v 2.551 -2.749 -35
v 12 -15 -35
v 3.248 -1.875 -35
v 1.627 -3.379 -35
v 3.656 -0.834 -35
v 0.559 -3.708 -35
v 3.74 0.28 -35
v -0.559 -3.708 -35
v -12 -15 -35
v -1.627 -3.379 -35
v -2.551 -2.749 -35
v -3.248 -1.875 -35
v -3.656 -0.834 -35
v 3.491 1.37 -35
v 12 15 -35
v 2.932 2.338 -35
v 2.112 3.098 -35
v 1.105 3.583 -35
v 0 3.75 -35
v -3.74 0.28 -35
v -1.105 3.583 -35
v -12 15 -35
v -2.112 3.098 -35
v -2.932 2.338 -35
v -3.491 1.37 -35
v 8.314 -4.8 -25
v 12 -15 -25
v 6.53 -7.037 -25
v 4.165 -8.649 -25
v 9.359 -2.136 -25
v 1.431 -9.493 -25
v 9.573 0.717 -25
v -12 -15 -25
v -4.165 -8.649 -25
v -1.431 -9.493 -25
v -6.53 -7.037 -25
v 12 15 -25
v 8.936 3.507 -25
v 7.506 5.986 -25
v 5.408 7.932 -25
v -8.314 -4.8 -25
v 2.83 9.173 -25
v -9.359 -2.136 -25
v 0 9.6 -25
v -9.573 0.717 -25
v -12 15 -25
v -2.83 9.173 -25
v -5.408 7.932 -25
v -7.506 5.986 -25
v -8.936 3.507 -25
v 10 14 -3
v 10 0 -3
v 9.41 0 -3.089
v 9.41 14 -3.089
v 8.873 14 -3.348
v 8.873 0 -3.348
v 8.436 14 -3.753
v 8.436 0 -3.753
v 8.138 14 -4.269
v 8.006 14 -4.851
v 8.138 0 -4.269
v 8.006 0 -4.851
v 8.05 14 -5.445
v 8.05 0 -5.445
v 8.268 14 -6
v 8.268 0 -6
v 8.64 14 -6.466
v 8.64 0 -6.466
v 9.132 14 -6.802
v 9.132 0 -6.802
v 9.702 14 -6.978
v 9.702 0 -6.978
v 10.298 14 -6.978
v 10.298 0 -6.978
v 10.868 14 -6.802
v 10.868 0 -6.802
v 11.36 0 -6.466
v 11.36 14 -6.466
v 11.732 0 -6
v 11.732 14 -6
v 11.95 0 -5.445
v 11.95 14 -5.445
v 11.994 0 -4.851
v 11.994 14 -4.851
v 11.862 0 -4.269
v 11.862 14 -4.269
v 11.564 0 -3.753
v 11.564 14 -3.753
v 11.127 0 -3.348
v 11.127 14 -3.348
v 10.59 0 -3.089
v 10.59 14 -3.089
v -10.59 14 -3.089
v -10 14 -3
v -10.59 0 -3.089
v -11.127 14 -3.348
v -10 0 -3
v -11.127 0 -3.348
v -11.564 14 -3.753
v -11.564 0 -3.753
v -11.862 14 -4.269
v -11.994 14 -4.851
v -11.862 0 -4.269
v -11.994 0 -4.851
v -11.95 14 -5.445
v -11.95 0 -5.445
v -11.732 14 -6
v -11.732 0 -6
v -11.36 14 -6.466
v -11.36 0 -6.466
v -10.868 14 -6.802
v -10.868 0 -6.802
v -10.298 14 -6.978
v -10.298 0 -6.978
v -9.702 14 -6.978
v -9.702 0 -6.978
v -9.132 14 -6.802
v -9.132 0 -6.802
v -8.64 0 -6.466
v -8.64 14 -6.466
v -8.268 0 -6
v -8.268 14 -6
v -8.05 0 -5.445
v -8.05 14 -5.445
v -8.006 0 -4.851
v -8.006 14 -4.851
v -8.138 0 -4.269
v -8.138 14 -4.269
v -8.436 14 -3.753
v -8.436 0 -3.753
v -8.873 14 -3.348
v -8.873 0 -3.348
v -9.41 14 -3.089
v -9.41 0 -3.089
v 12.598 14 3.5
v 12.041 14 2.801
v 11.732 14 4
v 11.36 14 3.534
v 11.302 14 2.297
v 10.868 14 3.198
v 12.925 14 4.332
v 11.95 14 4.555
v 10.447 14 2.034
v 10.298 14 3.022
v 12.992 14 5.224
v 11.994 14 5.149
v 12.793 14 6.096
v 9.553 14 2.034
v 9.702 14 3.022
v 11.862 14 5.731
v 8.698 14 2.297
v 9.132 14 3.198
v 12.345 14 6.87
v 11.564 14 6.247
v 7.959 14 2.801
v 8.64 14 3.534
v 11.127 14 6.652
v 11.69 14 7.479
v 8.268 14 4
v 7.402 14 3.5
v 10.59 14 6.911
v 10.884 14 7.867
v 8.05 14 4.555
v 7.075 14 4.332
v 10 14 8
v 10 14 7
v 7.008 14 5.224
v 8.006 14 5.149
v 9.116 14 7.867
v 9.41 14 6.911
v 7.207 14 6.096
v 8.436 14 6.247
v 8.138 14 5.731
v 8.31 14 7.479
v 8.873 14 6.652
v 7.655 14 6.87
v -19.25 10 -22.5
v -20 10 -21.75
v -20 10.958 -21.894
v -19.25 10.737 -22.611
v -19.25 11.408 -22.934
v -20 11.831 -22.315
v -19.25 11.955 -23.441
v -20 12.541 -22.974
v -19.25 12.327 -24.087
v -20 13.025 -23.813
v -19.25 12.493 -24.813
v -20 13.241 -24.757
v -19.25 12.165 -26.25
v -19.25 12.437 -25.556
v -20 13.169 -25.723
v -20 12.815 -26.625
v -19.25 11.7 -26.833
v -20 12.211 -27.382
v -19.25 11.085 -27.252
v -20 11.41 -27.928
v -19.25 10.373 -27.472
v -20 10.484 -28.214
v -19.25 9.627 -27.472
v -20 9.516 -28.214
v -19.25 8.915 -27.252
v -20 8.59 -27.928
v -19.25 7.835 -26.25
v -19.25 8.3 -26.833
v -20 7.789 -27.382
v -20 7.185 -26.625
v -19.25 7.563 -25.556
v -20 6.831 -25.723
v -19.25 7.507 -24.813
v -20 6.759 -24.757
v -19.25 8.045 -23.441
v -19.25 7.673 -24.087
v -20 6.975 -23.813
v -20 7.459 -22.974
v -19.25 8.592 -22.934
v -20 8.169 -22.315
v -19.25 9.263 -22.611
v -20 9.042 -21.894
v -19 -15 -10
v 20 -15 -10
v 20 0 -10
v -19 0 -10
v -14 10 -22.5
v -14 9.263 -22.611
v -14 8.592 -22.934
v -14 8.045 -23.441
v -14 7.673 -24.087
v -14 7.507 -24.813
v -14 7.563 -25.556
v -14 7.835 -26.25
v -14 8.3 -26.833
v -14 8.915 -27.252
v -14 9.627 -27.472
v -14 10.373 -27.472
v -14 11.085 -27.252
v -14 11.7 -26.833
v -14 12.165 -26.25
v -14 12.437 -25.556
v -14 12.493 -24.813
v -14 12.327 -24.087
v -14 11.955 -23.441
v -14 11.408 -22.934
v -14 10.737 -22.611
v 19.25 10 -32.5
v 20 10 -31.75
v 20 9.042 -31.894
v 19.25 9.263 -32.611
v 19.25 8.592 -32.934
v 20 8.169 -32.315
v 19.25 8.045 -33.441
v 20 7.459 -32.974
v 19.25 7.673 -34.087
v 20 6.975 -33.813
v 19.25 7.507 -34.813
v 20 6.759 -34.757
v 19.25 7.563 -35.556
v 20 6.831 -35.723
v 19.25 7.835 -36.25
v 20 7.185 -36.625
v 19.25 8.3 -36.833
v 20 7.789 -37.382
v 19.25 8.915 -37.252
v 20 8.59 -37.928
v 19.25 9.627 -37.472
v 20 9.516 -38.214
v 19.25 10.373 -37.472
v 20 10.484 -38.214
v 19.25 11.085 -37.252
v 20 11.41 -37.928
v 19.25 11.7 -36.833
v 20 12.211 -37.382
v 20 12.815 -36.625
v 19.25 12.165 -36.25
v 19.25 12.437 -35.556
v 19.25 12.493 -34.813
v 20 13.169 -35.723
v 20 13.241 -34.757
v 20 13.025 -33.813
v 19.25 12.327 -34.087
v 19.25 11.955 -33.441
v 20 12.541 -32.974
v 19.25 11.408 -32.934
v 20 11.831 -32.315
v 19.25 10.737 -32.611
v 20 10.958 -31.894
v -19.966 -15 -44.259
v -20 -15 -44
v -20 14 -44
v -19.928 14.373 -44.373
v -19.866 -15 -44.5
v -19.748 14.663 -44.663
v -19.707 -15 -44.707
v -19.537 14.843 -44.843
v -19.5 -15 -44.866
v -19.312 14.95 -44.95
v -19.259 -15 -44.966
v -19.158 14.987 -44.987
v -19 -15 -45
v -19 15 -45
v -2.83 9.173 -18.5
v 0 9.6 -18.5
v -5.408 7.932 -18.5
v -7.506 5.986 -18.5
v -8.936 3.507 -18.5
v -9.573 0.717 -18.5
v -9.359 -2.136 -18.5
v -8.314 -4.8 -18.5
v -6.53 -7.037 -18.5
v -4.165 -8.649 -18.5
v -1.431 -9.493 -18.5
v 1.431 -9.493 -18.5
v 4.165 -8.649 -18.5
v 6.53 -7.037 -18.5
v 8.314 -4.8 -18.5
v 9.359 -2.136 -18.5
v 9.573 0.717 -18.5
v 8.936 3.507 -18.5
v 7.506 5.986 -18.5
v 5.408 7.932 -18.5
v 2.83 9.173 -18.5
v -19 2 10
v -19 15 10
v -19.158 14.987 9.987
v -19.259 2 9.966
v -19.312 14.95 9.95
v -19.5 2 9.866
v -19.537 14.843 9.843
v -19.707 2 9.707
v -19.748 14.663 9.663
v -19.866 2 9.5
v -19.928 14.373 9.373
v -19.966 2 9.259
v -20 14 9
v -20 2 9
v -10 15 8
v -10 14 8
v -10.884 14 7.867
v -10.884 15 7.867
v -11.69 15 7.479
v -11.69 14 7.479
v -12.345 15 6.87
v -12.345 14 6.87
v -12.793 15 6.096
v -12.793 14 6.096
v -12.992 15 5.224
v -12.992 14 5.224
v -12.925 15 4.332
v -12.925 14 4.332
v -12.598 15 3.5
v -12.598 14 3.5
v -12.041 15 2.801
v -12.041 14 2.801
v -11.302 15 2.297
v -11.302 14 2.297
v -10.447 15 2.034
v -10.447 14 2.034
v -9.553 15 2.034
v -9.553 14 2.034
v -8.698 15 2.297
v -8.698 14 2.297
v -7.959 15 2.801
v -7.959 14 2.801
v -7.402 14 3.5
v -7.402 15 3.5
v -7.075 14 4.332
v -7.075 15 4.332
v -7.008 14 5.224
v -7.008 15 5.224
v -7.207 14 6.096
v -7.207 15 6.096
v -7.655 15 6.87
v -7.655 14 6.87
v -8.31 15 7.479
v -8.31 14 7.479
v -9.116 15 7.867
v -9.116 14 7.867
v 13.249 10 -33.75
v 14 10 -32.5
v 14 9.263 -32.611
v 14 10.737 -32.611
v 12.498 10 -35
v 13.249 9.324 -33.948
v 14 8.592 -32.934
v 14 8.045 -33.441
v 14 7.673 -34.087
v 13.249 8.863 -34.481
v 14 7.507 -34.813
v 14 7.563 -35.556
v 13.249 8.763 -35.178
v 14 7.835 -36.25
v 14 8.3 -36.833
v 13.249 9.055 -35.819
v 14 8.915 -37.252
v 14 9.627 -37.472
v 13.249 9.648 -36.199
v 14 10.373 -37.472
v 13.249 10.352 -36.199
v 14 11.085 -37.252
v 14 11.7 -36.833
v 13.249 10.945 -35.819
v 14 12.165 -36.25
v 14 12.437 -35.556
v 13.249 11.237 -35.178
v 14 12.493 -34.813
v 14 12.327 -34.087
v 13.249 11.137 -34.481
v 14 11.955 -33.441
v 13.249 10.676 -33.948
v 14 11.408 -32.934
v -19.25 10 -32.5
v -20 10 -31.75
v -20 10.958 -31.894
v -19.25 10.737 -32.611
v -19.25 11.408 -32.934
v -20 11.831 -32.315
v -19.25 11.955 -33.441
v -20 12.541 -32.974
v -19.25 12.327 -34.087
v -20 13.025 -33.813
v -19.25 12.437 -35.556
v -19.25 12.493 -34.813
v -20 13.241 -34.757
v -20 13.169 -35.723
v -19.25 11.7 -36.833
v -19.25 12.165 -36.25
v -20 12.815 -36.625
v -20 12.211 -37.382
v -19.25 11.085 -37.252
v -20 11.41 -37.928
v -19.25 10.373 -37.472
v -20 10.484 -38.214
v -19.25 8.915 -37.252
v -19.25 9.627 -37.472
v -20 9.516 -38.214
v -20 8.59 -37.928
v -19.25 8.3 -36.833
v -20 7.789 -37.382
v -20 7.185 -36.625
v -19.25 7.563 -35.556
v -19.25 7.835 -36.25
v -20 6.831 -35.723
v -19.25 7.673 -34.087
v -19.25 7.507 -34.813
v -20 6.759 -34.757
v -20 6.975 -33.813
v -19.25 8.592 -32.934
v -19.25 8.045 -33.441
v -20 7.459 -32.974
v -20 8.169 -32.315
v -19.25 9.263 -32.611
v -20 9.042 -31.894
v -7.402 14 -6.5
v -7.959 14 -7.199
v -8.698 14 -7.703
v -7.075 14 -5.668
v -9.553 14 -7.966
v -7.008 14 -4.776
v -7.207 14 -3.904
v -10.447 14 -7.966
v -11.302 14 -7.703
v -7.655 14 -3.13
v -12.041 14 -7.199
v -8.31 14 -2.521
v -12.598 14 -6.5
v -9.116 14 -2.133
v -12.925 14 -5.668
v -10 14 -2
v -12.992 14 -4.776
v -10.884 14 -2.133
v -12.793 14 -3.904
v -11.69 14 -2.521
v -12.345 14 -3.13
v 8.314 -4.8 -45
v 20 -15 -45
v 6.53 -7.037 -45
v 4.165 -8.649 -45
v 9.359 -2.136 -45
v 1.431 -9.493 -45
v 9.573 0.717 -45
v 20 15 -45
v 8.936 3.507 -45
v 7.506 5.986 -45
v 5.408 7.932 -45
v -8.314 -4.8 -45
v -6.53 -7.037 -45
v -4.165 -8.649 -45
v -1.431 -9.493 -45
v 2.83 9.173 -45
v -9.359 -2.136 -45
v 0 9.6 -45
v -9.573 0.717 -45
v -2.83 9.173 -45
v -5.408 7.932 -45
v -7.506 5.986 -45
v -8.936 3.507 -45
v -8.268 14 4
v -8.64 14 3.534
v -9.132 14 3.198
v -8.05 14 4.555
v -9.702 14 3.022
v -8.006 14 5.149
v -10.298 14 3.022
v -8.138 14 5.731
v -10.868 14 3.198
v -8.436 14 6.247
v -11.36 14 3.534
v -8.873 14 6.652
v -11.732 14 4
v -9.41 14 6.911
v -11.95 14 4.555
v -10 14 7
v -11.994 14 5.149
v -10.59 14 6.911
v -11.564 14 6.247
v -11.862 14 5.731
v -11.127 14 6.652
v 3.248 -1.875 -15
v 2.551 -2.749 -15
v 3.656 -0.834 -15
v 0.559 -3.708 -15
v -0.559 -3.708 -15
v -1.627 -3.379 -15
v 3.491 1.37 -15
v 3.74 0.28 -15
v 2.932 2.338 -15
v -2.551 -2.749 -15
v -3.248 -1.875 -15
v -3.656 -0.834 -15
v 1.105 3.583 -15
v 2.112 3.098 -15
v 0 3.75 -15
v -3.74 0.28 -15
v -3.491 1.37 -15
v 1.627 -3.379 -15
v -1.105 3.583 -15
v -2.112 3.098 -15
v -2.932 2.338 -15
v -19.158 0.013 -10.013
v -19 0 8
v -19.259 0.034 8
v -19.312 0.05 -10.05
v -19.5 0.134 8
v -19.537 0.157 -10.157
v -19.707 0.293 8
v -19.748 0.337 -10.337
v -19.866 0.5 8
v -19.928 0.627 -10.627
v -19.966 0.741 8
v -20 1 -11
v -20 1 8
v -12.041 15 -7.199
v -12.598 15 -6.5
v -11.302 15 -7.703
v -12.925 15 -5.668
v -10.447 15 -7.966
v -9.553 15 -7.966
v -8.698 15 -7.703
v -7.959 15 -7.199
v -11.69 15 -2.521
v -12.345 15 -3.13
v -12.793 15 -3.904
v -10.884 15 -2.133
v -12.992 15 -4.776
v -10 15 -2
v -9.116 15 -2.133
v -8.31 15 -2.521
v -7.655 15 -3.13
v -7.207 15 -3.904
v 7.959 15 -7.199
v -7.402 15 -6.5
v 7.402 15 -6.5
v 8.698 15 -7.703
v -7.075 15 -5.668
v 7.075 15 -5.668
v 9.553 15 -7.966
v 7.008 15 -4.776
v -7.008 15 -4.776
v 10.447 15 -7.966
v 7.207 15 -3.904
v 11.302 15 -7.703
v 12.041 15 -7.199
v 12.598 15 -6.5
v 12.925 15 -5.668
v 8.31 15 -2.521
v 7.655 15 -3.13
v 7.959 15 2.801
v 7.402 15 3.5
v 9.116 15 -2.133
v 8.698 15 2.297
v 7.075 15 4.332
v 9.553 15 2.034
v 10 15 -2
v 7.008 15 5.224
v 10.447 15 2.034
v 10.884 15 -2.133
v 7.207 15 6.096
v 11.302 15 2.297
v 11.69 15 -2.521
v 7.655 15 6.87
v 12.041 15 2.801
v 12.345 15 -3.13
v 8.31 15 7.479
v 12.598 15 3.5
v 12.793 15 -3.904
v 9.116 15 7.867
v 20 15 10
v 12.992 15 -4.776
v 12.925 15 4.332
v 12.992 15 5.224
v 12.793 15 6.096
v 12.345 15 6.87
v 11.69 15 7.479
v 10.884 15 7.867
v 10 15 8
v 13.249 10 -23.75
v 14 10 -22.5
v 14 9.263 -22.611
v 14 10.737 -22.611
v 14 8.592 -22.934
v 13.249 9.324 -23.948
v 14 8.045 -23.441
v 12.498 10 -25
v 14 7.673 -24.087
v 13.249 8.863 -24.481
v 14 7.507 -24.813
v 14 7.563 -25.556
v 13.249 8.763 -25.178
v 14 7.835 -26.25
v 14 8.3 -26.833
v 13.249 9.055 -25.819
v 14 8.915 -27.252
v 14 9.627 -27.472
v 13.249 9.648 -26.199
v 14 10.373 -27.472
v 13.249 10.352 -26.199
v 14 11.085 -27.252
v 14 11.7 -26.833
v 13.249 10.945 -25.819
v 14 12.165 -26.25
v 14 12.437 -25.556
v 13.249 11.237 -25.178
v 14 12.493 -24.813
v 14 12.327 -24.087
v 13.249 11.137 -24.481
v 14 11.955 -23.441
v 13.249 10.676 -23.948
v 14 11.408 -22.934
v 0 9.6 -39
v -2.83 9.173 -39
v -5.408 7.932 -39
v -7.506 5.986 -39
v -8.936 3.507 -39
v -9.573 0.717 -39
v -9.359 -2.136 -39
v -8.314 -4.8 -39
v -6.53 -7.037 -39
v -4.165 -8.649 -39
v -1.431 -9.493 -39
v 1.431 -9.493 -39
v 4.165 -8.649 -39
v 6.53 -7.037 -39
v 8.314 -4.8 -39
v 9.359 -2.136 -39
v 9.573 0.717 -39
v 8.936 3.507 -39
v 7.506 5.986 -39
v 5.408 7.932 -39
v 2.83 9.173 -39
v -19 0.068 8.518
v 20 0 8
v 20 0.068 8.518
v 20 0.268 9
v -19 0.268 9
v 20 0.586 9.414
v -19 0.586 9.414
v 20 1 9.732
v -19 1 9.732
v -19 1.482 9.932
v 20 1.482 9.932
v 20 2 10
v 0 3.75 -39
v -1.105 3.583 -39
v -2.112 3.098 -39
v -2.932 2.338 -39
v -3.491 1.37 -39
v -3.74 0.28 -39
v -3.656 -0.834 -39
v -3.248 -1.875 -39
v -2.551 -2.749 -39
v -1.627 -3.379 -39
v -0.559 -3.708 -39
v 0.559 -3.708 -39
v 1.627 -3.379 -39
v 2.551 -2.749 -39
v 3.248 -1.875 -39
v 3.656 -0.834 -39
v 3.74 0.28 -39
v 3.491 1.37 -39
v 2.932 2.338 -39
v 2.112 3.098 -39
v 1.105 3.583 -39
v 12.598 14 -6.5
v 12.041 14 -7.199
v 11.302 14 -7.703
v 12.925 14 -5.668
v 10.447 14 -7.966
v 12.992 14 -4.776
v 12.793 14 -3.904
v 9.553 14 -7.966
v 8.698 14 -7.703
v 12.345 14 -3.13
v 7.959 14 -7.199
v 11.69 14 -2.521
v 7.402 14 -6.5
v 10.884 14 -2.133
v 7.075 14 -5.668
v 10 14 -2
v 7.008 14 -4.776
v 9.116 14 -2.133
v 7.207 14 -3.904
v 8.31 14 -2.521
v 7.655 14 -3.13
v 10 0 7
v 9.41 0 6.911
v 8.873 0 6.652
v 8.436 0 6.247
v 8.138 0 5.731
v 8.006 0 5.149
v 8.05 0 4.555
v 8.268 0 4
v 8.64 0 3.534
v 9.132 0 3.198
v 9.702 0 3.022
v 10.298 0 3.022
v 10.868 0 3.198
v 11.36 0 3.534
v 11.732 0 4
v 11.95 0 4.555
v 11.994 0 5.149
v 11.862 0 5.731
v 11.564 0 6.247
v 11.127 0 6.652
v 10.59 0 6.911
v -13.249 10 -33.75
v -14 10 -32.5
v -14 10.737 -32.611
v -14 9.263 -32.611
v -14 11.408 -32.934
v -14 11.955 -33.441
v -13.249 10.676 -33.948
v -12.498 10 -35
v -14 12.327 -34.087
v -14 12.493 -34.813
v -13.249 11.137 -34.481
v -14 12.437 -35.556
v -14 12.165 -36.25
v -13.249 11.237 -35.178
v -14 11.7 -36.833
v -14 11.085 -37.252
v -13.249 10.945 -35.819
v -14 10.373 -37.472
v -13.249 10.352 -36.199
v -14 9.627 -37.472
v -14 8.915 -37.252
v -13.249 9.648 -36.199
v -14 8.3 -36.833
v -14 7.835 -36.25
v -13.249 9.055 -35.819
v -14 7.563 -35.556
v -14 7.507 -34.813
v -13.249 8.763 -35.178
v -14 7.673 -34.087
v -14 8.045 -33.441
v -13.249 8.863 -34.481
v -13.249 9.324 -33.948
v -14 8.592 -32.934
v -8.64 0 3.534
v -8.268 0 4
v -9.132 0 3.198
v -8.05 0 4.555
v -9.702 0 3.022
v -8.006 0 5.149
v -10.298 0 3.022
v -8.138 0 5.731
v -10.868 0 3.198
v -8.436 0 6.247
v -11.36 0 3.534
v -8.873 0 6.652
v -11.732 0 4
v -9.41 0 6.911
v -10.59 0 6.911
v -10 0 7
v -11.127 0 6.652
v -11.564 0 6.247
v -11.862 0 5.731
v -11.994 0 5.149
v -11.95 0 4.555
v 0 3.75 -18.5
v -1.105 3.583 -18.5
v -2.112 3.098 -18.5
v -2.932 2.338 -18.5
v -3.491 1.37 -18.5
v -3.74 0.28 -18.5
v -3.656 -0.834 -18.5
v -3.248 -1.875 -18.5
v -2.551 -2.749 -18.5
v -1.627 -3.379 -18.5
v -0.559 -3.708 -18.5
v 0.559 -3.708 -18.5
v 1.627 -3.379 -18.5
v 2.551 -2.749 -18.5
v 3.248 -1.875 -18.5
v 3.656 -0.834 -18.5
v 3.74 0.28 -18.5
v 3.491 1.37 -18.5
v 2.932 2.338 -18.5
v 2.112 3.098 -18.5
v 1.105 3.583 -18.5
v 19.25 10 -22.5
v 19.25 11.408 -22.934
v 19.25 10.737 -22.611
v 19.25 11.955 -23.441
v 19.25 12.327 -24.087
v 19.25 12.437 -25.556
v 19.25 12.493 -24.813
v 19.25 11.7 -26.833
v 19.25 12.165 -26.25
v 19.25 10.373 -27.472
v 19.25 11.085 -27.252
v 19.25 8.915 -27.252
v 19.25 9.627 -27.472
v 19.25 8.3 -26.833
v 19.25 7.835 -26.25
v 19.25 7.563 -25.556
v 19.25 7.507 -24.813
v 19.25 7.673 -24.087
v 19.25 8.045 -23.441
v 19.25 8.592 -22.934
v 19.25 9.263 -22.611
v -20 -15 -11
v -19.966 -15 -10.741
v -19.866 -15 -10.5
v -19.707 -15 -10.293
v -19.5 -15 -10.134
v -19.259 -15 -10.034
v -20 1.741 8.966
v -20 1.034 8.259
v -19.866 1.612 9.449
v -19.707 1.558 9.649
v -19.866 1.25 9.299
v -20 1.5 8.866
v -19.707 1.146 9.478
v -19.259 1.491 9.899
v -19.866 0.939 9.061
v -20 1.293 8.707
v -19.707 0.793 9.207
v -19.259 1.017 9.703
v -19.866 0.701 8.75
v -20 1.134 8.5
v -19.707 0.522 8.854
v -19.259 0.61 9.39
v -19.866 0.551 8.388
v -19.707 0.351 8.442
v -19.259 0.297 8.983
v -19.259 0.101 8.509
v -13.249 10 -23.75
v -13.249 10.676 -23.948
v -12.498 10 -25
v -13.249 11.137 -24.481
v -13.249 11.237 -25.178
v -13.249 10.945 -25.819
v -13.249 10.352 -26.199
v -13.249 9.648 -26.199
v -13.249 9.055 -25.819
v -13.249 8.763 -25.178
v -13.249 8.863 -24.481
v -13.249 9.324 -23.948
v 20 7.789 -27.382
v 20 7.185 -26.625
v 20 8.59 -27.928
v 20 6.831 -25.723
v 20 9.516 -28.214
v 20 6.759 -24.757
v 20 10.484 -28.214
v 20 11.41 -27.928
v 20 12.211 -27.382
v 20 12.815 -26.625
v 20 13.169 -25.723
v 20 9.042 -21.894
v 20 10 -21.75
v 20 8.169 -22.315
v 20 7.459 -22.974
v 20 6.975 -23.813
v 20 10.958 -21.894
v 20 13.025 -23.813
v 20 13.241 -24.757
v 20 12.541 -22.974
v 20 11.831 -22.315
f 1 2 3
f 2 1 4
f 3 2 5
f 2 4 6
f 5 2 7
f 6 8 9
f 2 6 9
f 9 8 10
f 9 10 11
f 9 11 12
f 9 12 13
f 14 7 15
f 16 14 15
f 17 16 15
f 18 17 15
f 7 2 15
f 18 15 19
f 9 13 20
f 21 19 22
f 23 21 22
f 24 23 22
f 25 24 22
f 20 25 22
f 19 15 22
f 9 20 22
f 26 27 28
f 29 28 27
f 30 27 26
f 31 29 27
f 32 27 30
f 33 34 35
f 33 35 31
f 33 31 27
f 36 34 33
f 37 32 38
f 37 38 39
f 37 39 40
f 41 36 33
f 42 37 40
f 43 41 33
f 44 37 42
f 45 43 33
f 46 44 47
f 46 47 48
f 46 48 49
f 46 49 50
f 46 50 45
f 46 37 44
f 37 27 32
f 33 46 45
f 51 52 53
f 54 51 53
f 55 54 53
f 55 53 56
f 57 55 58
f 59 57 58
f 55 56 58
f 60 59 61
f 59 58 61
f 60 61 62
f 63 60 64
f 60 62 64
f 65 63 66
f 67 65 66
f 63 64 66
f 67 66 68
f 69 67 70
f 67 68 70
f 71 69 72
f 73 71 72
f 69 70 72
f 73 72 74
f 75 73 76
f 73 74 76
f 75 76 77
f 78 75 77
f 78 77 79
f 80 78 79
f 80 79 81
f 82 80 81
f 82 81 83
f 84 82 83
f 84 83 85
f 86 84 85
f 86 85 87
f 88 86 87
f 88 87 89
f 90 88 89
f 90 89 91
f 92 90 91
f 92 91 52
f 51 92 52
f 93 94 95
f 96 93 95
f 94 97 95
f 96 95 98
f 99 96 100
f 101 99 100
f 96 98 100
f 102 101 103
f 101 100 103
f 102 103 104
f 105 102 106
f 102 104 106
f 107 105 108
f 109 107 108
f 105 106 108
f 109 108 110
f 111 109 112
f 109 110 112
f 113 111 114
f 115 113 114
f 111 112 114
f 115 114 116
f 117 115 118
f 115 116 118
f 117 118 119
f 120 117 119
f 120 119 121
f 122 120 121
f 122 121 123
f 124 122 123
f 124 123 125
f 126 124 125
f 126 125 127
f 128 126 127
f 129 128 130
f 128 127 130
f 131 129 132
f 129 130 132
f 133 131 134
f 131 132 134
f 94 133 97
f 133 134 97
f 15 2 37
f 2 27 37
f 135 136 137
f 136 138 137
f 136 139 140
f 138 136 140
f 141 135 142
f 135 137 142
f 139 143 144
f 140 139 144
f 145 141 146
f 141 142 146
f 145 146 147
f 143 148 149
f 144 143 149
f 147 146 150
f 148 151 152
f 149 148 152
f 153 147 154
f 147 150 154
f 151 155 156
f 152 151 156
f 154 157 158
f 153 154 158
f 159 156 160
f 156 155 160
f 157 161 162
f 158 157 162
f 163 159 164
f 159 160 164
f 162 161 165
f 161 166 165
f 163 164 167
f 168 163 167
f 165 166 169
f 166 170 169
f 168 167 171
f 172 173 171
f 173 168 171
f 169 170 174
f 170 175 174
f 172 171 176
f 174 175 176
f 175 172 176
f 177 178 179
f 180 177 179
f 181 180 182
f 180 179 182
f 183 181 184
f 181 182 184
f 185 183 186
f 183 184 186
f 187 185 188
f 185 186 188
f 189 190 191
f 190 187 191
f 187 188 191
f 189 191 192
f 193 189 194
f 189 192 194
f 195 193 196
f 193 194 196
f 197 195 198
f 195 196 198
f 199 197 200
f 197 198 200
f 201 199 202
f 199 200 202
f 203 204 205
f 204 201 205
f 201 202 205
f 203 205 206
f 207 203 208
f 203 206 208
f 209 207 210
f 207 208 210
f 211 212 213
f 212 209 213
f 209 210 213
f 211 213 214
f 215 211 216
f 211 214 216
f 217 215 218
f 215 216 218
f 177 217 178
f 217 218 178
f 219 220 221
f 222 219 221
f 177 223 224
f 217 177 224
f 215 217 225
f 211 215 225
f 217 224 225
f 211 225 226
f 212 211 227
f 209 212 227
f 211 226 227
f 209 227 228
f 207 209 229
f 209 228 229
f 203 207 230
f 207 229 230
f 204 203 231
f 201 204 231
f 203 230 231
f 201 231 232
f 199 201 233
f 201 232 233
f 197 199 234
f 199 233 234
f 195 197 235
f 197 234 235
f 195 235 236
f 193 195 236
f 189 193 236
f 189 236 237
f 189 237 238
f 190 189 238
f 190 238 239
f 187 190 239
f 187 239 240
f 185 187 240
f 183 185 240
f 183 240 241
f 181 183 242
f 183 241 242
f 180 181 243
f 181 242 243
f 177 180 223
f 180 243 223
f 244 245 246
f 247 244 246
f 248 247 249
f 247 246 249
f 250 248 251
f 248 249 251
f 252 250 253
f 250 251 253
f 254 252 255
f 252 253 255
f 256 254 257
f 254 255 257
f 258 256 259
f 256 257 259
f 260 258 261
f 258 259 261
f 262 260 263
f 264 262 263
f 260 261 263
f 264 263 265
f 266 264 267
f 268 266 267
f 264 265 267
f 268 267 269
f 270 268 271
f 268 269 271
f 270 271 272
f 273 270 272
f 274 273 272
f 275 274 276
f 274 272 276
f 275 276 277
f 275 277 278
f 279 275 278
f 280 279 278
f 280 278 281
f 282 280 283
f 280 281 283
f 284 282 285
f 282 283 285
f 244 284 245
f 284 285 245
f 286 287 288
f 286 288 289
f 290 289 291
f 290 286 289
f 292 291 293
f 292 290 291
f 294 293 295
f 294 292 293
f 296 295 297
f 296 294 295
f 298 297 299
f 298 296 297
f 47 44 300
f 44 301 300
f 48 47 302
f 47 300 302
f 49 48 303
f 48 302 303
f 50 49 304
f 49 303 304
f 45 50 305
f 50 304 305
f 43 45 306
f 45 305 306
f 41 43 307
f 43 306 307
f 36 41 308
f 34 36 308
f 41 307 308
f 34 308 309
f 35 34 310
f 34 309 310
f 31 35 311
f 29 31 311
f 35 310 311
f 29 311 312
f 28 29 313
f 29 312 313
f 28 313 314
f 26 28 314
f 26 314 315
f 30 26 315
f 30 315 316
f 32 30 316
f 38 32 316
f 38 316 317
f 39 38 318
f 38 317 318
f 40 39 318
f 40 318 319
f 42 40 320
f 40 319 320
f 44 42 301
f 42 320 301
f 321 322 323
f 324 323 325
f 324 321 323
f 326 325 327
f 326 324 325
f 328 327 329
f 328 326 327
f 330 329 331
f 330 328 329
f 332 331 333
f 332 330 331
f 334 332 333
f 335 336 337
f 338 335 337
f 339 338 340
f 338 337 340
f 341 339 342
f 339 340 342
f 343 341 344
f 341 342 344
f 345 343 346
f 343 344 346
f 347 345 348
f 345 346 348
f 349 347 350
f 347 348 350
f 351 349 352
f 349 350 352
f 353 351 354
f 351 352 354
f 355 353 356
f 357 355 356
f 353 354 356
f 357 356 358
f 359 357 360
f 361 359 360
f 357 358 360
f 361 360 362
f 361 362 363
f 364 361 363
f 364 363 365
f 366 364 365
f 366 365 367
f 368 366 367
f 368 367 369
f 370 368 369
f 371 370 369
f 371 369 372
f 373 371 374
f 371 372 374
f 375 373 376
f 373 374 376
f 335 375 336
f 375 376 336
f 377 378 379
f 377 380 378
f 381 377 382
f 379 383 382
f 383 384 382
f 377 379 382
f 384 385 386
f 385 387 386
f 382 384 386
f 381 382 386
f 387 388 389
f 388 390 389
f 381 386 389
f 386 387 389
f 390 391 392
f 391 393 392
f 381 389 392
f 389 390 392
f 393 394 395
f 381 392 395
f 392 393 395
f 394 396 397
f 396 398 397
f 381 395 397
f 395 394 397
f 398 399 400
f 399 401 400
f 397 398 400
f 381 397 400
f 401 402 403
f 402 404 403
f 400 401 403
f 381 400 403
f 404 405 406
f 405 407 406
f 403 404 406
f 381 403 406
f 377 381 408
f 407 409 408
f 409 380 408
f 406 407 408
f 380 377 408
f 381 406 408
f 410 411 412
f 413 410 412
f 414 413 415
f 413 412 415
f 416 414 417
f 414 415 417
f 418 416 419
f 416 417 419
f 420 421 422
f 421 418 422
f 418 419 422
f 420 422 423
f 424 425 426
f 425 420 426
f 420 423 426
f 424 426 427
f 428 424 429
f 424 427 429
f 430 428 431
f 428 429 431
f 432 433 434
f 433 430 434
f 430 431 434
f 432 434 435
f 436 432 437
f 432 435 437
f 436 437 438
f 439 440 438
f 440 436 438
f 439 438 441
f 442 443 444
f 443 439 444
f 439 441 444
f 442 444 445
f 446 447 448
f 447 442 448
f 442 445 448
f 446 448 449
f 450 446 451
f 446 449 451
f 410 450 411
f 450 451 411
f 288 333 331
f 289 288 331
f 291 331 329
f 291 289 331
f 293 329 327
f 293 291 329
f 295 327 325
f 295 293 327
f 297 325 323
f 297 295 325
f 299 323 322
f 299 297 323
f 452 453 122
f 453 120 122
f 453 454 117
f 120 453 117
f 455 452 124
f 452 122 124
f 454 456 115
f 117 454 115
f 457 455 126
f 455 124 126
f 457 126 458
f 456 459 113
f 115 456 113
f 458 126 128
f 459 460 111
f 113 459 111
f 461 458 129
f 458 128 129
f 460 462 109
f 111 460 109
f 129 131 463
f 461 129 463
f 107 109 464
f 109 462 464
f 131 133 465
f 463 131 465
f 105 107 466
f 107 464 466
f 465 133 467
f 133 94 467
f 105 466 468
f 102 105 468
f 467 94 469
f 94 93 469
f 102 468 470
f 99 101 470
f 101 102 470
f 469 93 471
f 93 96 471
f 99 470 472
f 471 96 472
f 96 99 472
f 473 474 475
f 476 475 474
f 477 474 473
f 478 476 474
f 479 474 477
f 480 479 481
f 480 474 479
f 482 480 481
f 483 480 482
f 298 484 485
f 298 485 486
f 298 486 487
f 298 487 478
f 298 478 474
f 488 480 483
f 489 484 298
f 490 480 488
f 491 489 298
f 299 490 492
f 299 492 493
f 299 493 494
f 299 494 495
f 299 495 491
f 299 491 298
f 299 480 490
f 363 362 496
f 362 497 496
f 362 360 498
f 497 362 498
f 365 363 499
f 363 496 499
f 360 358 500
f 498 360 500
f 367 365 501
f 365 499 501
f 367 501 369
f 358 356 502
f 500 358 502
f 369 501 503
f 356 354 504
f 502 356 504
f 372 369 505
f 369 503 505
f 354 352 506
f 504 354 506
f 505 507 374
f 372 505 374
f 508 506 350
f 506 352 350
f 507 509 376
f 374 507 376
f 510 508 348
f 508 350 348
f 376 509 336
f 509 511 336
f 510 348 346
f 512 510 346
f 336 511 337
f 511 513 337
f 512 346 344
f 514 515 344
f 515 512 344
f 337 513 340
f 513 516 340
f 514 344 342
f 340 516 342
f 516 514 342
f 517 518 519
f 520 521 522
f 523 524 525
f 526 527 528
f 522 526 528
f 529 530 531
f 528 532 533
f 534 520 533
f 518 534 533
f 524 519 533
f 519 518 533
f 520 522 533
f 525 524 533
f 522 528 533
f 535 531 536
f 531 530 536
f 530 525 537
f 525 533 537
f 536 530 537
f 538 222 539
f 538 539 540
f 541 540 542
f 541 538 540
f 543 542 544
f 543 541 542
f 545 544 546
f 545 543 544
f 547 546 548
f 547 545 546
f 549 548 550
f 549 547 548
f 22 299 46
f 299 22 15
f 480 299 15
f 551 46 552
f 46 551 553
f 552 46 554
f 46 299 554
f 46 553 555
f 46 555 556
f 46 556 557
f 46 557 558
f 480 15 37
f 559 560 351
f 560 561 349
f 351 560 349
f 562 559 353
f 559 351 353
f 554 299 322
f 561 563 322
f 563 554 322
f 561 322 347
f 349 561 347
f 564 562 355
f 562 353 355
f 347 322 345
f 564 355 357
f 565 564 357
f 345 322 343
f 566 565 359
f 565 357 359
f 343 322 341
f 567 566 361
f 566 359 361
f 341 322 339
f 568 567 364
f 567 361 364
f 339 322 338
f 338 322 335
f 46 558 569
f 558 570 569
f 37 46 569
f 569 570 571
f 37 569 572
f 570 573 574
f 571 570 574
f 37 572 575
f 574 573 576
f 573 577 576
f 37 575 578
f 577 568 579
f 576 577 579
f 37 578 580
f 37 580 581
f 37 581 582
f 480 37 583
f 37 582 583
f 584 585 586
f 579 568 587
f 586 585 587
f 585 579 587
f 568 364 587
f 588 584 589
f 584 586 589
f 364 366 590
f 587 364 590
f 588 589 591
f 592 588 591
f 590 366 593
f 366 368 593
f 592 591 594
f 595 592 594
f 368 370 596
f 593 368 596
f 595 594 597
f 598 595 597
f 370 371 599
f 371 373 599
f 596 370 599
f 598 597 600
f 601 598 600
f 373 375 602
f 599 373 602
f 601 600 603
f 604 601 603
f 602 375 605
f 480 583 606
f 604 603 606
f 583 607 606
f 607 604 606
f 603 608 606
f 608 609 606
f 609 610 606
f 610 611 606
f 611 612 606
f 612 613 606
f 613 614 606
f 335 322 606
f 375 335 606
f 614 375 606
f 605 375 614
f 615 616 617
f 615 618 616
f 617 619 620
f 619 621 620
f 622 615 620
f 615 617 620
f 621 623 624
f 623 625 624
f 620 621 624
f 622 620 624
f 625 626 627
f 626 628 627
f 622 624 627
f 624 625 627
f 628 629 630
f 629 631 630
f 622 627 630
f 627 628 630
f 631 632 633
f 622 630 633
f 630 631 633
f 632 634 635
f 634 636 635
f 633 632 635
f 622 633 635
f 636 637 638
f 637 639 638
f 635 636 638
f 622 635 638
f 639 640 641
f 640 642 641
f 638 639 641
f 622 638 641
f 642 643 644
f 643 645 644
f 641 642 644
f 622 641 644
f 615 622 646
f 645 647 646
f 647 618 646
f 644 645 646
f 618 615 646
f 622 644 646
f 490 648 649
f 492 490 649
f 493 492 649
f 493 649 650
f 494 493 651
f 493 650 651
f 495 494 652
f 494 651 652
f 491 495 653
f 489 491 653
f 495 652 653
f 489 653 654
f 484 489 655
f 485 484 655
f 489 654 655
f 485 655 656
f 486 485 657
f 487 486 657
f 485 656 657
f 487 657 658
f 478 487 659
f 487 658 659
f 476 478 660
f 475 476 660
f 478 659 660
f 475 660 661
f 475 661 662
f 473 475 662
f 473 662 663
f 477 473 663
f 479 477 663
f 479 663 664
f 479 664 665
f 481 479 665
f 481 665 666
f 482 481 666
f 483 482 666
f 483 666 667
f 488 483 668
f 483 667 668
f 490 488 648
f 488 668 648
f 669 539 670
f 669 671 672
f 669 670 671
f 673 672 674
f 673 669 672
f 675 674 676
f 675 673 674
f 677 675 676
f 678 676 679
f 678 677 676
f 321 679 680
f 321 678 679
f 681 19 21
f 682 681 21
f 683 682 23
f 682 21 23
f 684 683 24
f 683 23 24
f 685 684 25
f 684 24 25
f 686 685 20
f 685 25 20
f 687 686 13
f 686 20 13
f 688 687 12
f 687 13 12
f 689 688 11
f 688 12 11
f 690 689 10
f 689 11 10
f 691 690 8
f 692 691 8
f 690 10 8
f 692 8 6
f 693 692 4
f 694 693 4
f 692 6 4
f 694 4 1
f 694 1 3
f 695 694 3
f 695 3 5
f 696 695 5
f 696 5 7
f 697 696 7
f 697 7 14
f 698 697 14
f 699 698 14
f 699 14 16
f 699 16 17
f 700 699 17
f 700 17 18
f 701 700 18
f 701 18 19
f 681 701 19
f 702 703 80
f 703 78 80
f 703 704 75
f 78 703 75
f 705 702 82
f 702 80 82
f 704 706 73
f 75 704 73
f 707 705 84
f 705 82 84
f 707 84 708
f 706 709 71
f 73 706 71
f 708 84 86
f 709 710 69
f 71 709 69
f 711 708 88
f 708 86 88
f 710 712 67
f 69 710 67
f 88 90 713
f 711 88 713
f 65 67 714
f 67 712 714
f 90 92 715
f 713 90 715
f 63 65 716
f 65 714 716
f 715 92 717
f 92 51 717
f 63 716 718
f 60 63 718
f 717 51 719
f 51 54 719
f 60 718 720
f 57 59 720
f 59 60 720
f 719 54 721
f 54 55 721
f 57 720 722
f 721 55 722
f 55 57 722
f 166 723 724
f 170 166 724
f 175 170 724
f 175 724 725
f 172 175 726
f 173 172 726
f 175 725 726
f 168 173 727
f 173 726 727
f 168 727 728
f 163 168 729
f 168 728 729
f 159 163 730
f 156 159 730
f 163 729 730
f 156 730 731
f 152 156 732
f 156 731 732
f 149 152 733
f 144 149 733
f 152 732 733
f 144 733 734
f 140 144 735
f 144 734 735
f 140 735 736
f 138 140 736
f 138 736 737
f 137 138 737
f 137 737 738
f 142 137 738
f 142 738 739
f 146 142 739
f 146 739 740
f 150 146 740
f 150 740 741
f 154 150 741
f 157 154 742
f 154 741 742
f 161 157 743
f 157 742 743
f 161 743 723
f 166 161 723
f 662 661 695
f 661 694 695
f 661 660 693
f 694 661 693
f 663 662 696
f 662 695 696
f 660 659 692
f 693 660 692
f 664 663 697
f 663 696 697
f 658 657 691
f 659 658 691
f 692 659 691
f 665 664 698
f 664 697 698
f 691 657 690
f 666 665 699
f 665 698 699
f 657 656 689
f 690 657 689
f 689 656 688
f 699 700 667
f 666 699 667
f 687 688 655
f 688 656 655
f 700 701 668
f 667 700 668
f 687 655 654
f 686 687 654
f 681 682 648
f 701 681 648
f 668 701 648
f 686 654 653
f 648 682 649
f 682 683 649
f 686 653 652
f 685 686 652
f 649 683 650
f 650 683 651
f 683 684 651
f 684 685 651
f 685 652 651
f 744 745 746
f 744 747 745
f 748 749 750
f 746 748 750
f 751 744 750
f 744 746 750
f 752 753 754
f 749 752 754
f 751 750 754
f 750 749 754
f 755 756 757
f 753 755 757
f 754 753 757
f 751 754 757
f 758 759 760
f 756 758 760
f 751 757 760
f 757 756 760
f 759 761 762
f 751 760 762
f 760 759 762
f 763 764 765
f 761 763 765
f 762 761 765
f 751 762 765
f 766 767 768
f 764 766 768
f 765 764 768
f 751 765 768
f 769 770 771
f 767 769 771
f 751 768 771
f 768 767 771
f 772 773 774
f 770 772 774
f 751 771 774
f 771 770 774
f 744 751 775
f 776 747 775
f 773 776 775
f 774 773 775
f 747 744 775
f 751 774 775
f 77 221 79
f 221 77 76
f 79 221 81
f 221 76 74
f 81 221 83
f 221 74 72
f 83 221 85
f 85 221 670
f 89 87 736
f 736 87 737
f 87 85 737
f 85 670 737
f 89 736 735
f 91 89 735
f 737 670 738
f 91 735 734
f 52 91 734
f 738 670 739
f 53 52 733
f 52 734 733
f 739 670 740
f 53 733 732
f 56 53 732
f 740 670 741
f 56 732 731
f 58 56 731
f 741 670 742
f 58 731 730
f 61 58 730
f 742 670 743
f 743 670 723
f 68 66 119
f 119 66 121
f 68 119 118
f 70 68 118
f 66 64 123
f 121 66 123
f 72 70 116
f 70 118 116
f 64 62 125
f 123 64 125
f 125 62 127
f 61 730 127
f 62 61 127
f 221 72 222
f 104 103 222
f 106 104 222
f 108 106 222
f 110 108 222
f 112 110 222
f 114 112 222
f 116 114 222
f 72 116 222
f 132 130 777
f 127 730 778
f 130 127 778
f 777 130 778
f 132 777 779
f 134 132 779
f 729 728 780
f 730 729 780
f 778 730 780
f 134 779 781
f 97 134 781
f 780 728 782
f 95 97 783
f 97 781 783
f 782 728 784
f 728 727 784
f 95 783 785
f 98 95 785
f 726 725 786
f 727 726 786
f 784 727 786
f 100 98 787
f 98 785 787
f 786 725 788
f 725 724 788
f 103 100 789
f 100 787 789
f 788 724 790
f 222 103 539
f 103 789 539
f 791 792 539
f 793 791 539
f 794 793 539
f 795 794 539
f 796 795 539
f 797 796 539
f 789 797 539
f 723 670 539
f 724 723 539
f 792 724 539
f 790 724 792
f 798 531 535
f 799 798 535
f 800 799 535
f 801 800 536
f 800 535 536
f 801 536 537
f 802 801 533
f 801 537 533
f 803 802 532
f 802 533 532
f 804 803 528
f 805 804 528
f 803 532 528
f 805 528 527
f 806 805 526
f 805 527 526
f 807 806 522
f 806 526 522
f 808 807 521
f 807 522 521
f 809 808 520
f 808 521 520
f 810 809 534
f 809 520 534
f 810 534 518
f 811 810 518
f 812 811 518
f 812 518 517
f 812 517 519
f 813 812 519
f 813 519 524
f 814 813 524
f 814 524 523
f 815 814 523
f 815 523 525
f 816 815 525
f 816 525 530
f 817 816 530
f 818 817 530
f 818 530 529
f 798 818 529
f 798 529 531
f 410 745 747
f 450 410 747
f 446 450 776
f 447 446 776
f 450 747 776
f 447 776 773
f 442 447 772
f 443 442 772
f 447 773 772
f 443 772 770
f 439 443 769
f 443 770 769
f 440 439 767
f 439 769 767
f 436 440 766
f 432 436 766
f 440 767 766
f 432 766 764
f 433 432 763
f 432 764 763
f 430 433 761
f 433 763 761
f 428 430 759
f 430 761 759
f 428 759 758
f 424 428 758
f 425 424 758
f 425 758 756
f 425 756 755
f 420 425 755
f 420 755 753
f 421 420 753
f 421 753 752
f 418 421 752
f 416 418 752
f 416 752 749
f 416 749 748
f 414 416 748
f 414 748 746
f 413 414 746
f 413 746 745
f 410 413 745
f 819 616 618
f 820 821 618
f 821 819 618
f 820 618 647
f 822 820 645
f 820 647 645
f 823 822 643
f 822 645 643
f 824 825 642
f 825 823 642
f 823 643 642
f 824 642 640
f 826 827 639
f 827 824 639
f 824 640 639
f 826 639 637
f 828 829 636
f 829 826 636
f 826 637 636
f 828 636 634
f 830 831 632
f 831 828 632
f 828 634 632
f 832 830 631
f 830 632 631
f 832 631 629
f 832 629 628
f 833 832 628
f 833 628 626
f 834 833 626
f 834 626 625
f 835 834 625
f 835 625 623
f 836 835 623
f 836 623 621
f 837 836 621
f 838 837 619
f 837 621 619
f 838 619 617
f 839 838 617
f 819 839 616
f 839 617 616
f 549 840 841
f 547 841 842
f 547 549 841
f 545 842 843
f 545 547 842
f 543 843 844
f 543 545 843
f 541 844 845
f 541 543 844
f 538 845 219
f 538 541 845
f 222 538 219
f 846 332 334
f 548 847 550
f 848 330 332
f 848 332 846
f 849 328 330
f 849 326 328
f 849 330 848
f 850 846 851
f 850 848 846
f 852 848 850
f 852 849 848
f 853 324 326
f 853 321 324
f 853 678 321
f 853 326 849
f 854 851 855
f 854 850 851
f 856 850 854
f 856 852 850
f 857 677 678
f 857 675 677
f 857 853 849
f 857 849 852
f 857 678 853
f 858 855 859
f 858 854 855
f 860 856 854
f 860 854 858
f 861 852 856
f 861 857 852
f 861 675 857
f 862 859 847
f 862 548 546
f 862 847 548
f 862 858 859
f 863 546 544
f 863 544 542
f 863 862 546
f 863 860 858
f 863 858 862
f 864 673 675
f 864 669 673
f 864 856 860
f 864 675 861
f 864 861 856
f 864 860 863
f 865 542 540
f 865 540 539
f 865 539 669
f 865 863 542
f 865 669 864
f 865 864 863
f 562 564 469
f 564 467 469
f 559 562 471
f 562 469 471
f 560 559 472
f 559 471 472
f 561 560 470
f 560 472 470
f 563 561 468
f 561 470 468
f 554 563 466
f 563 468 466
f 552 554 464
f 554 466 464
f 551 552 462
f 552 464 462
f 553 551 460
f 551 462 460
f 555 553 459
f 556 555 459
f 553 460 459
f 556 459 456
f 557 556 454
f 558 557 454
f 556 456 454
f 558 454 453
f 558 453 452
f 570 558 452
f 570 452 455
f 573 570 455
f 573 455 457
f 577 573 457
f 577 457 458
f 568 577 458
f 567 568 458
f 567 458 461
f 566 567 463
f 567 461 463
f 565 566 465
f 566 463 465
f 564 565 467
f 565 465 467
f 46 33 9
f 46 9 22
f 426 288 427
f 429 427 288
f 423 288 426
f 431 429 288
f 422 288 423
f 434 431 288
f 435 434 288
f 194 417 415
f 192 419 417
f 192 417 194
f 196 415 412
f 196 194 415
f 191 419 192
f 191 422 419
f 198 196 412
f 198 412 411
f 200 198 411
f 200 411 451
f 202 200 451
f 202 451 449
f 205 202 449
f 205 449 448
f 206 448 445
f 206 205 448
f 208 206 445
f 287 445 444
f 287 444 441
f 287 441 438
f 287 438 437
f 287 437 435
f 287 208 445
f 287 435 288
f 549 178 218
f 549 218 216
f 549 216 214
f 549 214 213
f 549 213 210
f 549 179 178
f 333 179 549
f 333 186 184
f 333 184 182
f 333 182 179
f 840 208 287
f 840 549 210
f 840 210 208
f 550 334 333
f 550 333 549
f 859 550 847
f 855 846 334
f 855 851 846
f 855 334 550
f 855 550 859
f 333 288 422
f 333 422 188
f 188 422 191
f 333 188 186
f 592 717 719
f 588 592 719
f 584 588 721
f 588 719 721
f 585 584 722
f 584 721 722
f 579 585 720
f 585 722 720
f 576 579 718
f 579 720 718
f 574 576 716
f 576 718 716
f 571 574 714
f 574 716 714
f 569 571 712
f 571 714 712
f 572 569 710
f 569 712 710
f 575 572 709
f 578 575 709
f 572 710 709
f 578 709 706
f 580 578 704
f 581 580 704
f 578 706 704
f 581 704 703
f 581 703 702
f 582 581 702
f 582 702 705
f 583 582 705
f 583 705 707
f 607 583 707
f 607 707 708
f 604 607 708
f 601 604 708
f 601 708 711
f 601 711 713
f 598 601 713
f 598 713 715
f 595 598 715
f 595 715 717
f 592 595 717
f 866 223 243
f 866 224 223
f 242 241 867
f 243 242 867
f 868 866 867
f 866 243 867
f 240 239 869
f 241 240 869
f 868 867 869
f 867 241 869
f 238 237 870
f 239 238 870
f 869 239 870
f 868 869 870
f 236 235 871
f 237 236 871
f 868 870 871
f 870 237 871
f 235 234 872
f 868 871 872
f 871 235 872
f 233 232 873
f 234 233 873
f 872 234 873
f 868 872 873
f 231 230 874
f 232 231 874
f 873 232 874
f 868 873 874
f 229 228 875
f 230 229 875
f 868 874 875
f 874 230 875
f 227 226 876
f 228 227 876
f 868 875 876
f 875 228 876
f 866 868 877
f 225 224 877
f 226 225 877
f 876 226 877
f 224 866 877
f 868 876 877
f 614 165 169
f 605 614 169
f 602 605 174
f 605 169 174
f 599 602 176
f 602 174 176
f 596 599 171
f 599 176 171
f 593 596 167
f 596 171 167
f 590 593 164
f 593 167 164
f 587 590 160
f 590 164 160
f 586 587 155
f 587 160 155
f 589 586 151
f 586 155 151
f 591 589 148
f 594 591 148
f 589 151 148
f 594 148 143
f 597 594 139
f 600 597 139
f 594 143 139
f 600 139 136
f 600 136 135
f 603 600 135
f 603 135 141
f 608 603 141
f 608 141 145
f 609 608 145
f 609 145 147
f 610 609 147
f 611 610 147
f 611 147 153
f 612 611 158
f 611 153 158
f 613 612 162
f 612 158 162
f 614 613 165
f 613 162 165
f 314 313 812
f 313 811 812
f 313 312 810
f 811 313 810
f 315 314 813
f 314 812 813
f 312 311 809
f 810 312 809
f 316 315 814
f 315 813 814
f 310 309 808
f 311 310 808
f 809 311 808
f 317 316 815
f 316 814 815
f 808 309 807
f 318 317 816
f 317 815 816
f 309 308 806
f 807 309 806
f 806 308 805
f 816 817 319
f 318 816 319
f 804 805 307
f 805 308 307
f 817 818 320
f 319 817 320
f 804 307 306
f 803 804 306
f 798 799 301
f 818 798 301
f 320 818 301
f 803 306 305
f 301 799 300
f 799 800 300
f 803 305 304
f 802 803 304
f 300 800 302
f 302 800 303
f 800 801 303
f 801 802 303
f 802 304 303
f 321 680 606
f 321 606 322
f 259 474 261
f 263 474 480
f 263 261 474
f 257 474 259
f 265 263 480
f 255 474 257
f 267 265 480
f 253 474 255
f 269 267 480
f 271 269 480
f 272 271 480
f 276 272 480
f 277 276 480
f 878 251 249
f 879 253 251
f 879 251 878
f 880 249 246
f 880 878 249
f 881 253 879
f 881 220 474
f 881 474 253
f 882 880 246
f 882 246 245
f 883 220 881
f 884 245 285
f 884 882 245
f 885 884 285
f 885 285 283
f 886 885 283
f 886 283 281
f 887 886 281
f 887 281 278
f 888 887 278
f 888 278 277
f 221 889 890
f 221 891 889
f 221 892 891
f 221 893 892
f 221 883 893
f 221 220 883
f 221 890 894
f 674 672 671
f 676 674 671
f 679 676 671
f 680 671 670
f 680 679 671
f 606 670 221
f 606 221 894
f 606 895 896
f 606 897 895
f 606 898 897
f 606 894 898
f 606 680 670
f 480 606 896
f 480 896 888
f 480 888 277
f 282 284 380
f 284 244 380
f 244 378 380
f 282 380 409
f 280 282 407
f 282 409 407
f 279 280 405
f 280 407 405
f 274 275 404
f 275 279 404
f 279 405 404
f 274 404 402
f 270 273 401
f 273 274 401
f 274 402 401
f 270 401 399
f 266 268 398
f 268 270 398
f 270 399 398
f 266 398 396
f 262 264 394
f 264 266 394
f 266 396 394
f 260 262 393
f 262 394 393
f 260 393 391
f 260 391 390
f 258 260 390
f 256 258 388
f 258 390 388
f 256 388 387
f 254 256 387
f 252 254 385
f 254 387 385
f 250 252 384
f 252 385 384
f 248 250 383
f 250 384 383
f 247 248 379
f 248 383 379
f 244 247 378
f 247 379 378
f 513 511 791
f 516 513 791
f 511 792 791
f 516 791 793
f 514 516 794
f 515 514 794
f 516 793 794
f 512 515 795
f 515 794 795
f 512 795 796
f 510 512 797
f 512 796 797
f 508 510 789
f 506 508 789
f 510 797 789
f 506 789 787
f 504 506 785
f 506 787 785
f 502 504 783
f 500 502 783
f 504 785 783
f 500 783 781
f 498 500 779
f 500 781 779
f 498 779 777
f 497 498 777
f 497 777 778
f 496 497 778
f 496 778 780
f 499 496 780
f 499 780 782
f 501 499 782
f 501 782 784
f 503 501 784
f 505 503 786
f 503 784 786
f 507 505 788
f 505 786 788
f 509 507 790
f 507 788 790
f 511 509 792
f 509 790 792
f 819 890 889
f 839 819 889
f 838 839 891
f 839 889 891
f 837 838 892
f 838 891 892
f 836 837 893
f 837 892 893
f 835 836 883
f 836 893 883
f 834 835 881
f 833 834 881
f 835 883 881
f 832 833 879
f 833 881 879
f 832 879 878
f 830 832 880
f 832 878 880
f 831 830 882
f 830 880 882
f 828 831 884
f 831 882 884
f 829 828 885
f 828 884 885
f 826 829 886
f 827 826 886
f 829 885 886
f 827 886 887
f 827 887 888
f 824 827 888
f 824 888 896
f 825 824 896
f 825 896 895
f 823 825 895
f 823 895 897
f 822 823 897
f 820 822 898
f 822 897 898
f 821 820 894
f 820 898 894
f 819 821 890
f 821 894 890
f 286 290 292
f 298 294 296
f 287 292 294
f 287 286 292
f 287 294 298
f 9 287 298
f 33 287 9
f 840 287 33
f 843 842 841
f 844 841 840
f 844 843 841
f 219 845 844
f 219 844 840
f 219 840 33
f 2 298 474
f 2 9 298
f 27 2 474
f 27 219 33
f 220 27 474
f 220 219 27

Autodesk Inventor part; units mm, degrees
ref_plane "YZ Plane" through (0, 0, 0) normal (1, 0, 0) x (0, 1, 0)
ref_plane "XZ Plane" through (0, 0, 0) normal (0, 1, 0) x (-1, 0, 0)
ref_plane "XY Plane" through (0, 0, 0) normal (0, 0, 1) x (1, 0, 0)
sketch "Sketch1" plane through (0, 0, 0) normal (0, 1, 0) x (-1, 0, 0)
  line L0 (-20, 10) -> (20, 10)
  line L1 (20, 10) -> (20, -10)
  line L2 (20, -10) -> (-20, -10)
  line L3 (-20, -10) -> (-20, 10)
  line L4 (-20, 10) -> (20, -10) construction
  line L5 (20, 10) -> (-20, -10) construction
  point P0 (0, 0)
  dimension "d0" = 40
  dimension "d1" = 20
extrude "Extrusion1" add sketch "Sketch1" along normal blind 15
sketch "Sketch2" plane through (0, 15, 0) normal (0, 1, 0) x (1, 0, 0)
  line L0 (20, 10) -> (-20, 10) construction
  line L1 (-20, -10) -> (20, -10) construction
  line L2 (20, -10) -> (20, 10) construction
  line L3 (20, 10) -> (-20, 10) construction
  line L4 (-20, 10) -> (-20, -10) construction
  line L5 (-20, -10) -> (20, 10) construction
  line L6 (20, -10) -> (-20, 10) construction
  line L7 (-10, -5) -> (10, -5) construction
  line L8 (10, -5) -> (10, 5) construction
  line L9 (10, 5) -> (-10, 5) construction
  line L10 (-10, 5) -> (-10, -5) construction
  line L11 (-10, -5) -> (10, 5) construction
  line L12 (10, -5) -> (-10, 5) construction
  point P0 (0, 0)
  dimension "d4" = 20
hole "Hole1" at (-10, 15, -5) at (-10, 15, 5) at (10, 15, 5) at (10, 15, -5) direction (0, -1, 0) diameter 4 end through all counterbore diameter 6 counterbore depth 1
fillet "Fillet1" radius 2 1 edges at (0, 0, 10)
sketch "Sketch3" plane through (20, 0, -10) normal (1, 0, 0) x (0, 0, -1)
  line L0 (0, 0) -> (0, 15) projected
  line L1 (0, 15) -> (5, 15)
  line L2 (5, 15) -> (5, -15)
  line L3 (5, -15) -> (0, -15)
  line L4 (0, -15) -> (0, 15)
  point P0 (-10, 0)
  dimension "d13" = 5
  dimension "d14" = 30
extrude "Extrusion2" add sketch "Sketch3" against normal up to surface (40 mm away)
sketch "Sketch4" plane through (20, -15, -15) normal (0, 0, -1) x (-1, 0, 0)
  line L0 (0, 17) -> (0, 30) projected
  line L1 (0, 0) -> (40, 0) projected
  line L2 (0, 30) -> (40, 30)
  line L3 (40, 30) -> (40, 0)
  line L4 (40, 0) -> (0, 0)
  line L5 (0, 0) -> (0, 30)
  point P0 (20, 15)
extrude "Extrusion3" add sketch "Sketch4" along normal blind 10
sketch "Sketch5" plane through (20, -15, -25) normal (0, 0, -1) x (-1, 0, 0)
  point P0 (20, 15)
  point P1 (20, 15)
hole "Hole2" at (0, 0, -25) direction (0, 0, 1) diameter 7.5 depth 10
sketch "Sketch6" plane through (20, -15, -25) normal (0, 0, -1) x (-1, 0, 0)
  point P0 (20, 15)
  point P1 (20, 15)
hole "Hole3" at (0, 0, -25) direction (0, 0, 1) diameter 19.2 depth 6.5
sketch "Sketch7" plane through (20, -15, -25) normal (0, 0, -1) x (-1, 0, 0)
  line L0 (40, 0) -> (40, 30) projected
  line L1 (40, 30) -> (0, 30) projected
  line L2 (40, 0) -> (32, 0)
  line L3 (32, 0) -> (32, 30)
  line L4 (32, 30) -> (40, 30)
  line L5 (40, 30) -> (40, 0)
  line L6 (0, 0) -> (40, 0) construction
  line L7 (20, 0) -> (20, 30) construction
  line L8 (0, 0) -> (0, 30)
  line L9 (0, 0) -> (8, 0)
  line L10 (8, 0) -> (8, 30)
  line L11 (8, 30) -> (0, 30)
  line L12 (0, 30) -> (0, 0)
  point P0 (20, 15)
  dimension "d33" = 8
extrude "Extrusion4" add sketch "Sketch7" along normal blind 10
sketch "Sketch8" plane through (20, -15, -35) normal (0, 0, -1) x (-1, 0, 0)
  line L0 (40, 15) -> (40, 0) projected
  line L1 (40, 30) -> (0, 30) projected
  line L2 (40, 0) -> (0, 0)
  line L3 (0, 0) -> (0, 30)
  line L4 (0, 30) -> (40, 30)
  line L5 (40, 30) -> (40, 0)
  point P0 (20, 15)
extrude "Extrusion5" add sketch "Sketch8" along normal blind 10
sketch "Sketch9" plane through (20, -15, -45) normal (0, 0, -1) x (-1, 0, 0)
  line L0 (40, 15) -> (40, 0) construction
  line L1 (0, 17) -> (0, 30) construction
  line L2 (40, 0) -> (0, 30) construction
  line L3 (40, 17) -> (40, 30) construction
  line L4 (0, 0) -> (0, 15) construction
  line L5 (40, 30) -> (0, 0) construction
  point P0 (20, 15)
  point P1 (20, 15)
hole "Hole4" at (0, 0, -45) direction (0, 0, 1) diameter 7.5 depth 10 counterbore diameter 19.2 counterbore depth 6
sketch "Sketch10" plane through (-20, 2, 10) normal (-1, 0, 0) x (0, 0, 1)
  line L0 (-55, -17) -> (-55, 13) construction
  line L1 (-55, 13) -> (-45, 13) construction
  line L2 (-45, 13) -> (-45, 8) construction
  line L3 (-45, 8) -> (-55, 8) construction
  line L4 (-55, 8) -> (-55, 13) construction
  line L5 (-55, 13) -> (-35, 13) construction
  line L6 (-35, 13) -> (-35, 8) construction
  line L7 (-35, 8) -> (-55, 8) construction
  line L8 (-55, 8) -> (-55, 13) construction
  point P0 (-10, -2)
  dimension "d45" = 10
  dimension "d46" = 5
  dimension "d47" = 20
hole "Hole5" at (-20, 10, -35) at (-20, 10, -25) direction (1, 0, 0) diameter 5 depth 6 tip angle 118 countersink diameter 6.5 countersink angle 90
mirror "Mirror1" about plane through (0, 0, 0) normal (1, 0, 0) of "Hole5"
fillet "Fillet2" radius 1 6 edges at (-20, 15, -17.5) (-20, 0.5858, 9.4142) (-20, 0, -1) (-20, 8.5, 10) (-20, -7.5, -10) (-20, 0, -45)
properties part number "Swivel Joint Driver"
